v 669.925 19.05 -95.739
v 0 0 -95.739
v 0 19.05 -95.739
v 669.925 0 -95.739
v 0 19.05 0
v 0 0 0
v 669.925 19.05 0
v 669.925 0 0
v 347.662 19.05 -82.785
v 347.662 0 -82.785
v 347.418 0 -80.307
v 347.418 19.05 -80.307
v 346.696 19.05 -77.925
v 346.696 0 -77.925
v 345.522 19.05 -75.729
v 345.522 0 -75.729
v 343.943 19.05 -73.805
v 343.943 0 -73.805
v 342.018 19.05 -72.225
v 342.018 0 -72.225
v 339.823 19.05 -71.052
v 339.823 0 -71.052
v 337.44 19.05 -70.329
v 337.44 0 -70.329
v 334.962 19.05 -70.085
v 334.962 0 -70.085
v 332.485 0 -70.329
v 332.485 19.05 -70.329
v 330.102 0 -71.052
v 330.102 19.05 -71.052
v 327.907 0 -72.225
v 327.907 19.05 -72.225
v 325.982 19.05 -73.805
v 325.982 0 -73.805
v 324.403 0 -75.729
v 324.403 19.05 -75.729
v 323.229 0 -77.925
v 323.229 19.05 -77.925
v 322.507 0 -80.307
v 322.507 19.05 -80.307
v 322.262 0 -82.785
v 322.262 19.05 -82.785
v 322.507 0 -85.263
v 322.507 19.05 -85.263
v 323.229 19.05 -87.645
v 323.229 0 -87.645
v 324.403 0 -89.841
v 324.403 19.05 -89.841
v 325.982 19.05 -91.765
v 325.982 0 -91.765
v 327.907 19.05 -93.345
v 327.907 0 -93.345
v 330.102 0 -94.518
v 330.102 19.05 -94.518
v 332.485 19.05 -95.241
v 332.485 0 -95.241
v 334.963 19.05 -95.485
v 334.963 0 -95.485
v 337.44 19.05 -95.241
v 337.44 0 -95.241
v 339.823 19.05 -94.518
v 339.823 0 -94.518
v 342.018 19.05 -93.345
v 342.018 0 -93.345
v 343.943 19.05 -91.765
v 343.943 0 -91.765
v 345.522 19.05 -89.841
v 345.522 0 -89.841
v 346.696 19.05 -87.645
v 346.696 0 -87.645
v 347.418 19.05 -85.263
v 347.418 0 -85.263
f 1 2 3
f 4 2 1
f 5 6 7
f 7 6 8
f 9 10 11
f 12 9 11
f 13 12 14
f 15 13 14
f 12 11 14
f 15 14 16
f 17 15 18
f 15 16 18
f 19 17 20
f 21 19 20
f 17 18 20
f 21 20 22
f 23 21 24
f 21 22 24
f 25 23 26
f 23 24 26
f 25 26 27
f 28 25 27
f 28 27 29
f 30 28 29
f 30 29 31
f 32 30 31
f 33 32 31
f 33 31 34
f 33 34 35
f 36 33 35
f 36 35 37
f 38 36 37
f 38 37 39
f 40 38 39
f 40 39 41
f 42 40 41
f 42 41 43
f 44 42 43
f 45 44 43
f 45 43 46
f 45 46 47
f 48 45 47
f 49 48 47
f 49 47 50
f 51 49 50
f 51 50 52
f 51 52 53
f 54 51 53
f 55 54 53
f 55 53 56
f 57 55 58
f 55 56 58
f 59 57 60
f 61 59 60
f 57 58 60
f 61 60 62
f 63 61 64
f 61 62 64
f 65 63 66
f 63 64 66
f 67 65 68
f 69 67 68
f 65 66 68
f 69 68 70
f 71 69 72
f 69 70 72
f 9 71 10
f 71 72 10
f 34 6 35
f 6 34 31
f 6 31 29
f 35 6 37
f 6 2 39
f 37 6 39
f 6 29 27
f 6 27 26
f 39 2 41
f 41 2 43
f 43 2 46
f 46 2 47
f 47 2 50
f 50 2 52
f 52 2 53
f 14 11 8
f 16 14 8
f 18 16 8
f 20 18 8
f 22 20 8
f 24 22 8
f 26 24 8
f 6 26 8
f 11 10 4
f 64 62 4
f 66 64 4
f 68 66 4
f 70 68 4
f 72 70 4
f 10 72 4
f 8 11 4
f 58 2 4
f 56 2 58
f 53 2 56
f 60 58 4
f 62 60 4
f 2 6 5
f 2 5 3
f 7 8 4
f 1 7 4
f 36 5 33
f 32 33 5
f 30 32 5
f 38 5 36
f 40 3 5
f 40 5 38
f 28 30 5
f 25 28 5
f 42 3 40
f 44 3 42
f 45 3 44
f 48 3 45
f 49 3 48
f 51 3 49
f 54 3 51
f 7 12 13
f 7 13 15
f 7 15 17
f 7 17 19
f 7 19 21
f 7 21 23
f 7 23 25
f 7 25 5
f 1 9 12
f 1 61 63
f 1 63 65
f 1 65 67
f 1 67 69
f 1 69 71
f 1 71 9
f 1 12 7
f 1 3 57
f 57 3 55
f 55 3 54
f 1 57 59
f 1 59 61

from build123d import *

# Parameters (mm, degrees)
SKETCH1_W           = 669.925
SKETCH1_H           = 95.73895
BOSS_EXTRUDE1_DEPTH = 19.05
SKETCH2_R           = 12.7
CUT_EXTRUDE4_DEPTH  = 20.05


with BuildPart() as part:
    # Sketch1 → Boss-Extrude1 (new body)
    with BuildSketch(Plane(origin=(0, 0, 0), x_dir=(1, 0, 0), z_dir=(0, 1, 0))):
        with Locations((334.9625, 47.869475)):
            Rectangle(SKETCH1_W, SKETCH1_H)
    extrude(amount=BOSS_EXTRUDE1_DEPTH)

    # Sketch2 → Cut-Extrude4 (cut, through all)
    with BuildSketch(Plane.XZ):
        with Locations((334.9625, -82.78495)):
            Circle(SKETCH2_R)
    extrude(amount=-CUT_EXTRUDE4_DEPTH, mode=Mode.SUBTRACT)


solid = part.part
